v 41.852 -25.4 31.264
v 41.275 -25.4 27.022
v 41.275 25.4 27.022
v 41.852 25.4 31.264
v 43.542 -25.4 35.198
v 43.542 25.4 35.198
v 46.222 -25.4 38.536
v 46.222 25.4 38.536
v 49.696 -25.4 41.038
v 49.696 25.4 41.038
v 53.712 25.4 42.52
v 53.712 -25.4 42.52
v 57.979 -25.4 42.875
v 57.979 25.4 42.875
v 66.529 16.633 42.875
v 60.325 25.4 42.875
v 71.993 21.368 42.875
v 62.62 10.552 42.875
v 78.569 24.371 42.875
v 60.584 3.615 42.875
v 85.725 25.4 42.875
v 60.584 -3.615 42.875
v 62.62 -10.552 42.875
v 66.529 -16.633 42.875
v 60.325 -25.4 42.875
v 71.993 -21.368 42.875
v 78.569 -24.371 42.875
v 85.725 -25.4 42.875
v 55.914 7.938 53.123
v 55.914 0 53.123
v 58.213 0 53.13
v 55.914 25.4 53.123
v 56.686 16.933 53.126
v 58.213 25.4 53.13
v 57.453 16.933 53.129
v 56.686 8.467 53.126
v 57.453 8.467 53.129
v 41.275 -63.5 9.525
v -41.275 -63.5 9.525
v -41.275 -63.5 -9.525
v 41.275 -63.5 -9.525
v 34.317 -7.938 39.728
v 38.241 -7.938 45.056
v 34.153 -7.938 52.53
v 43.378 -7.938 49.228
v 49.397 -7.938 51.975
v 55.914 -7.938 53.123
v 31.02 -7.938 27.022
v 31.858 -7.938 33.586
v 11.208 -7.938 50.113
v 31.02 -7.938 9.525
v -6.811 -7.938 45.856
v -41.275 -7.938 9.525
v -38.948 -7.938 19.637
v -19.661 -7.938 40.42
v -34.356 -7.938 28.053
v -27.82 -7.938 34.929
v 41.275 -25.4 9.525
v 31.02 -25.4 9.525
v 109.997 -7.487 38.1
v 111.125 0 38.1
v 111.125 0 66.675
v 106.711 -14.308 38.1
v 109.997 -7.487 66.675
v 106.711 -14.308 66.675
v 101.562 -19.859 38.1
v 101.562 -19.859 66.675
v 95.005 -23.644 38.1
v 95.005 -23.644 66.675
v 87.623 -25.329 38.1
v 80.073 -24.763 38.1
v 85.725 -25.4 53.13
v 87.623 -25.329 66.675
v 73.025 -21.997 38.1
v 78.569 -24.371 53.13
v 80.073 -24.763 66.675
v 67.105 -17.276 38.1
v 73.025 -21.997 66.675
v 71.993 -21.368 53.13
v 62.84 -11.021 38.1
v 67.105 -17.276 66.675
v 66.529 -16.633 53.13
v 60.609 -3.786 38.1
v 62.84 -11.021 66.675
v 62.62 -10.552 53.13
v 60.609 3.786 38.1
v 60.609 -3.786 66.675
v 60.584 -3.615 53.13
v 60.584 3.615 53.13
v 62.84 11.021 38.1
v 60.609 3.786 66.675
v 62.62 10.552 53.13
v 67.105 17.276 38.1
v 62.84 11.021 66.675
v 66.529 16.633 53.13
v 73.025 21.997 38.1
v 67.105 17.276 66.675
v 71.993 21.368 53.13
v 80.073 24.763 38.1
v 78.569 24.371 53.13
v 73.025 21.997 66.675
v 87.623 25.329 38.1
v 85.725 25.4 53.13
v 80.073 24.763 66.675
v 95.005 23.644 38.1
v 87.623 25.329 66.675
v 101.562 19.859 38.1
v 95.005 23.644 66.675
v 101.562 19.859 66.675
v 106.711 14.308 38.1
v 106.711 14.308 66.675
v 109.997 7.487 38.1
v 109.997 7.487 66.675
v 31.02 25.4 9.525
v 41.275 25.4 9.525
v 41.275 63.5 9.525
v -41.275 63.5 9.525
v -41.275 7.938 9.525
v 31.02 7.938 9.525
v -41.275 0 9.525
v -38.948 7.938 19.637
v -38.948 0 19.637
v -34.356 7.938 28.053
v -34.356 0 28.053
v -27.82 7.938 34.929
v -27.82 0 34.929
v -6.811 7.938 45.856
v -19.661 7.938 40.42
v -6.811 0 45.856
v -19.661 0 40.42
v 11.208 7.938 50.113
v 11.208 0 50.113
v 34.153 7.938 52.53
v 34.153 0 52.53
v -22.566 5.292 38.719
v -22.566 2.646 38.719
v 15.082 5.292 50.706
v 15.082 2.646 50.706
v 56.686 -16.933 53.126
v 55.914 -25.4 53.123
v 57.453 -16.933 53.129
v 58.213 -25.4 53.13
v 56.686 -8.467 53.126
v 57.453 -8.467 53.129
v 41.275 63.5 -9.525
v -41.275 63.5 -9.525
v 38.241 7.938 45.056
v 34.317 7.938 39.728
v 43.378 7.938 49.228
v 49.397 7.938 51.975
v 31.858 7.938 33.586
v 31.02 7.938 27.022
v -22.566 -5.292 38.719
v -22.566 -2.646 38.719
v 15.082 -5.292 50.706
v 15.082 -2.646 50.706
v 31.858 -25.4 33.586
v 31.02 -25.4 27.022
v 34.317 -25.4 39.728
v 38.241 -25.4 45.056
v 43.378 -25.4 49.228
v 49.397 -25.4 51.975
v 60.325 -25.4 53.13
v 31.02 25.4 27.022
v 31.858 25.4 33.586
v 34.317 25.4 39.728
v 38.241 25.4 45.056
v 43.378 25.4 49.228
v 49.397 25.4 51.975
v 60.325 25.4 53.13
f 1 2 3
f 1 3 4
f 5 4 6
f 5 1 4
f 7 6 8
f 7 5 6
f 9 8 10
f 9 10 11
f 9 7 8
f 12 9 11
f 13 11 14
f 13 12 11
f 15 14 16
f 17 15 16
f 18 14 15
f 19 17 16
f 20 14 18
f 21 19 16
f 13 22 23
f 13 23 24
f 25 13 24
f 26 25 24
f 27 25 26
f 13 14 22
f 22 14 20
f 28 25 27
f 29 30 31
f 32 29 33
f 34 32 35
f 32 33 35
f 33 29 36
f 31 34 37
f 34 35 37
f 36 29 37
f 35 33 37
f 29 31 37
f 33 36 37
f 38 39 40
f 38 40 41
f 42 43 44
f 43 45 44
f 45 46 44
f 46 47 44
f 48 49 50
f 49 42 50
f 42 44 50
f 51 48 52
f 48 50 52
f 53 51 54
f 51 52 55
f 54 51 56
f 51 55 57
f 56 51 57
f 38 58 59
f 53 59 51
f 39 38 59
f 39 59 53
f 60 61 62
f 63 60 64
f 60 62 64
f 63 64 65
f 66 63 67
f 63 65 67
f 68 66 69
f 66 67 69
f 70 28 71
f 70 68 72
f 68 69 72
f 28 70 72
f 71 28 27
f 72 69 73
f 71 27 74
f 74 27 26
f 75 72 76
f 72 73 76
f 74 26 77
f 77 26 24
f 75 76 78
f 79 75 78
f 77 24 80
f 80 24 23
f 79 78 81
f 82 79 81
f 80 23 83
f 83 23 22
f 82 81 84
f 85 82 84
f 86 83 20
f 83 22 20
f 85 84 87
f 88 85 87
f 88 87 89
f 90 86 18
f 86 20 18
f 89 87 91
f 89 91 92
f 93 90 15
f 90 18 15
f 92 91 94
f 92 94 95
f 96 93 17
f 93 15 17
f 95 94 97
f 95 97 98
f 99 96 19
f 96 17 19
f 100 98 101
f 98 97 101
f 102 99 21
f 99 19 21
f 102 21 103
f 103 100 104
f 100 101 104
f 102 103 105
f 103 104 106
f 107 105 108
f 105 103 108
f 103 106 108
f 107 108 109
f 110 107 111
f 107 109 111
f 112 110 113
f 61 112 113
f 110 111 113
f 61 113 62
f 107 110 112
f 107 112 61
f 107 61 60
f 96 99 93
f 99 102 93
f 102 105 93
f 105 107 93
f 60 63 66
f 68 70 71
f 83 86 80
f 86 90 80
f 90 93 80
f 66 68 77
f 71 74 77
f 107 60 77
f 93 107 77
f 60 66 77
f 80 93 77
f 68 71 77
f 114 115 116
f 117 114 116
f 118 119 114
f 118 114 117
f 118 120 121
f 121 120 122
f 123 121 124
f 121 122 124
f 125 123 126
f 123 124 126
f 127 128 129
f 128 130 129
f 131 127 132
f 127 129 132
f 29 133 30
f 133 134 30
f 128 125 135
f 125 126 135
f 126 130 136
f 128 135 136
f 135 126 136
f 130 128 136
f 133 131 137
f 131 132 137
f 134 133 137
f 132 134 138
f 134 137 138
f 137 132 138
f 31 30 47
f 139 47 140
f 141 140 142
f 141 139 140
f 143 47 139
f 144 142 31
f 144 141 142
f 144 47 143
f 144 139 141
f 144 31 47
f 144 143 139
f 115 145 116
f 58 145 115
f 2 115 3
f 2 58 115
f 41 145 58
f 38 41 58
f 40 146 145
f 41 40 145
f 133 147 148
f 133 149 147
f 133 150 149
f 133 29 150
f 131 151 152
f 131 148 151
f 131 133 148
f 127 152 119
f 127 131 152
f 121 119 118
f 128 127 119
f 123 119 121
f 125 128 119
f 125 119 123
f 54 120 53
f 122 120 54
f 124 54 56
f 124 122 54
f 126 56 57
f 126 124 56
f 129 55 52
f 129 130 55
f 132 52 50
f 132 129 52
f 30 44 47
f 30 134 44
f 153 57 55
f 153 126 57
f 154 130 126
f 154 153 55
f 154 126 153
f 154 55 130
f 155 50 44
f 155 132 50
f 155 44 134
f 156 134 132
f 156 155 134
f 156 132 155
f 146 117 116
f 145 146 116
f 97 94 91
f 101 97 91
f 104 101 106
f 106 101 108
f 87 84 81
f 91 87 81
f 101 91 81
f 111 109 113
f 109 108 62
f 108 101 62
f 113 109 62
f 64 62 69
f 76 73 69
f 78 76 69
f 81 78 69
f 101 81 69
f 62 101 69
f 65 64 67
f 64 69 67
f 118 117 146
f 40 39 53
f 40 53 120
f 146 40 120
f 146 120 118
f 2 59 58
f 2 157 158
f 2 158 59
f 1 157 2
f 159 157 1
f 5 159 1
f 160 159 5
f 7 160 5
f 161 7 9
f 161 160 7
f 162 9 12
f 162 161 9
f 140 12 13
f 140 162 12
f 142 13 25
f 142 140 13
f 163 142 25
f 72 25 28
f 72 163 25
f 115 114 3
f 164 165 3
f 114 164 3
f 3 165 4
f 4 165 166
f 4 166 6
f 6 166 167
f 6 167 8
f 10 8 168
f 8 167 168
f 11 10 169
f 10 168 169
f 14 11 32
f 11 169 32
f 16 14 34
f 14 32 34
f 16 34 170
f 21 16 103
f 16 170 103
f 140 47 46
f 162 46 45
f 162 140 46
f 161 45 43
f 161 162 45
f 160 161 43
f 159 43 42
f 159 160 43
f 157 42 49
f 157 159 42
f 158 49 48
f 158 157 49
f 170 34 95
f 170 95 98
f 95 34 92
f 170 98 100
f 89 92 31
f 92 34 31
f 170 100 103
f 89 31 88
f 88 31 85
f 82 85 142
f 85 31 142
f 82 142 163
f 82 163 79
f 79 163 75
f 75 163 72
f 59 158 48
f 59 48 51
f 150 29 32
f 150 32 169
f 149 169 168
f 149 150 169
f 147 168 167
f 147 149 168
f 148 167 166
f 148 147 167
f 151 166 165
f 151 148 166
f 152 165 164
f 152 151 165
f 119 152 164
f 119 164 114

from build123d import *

# Parameters (mm, degrees)
F1_DEPTH = 63.5
F0_W     = 25.4
F0_H     = 10.2552045137
F2_DEPTH = 25.4
F3_DEPTH = 7.9375


with BuildPart() as f1:
    # F0 (on Front) → F1 (new body, symmetric)
    with BuildSketch(Plane.XZ):
        Polygon((-41.275, 9.525), (-41.275, -9.525), (41.275, -9.525), (41.275, 9.525), (31.0197954863, 9.525), align=None)
    extrude(amount=F1_DEPTH, both=True)

    # F0 (on Front) → F2 (join, symmetric)
    with BuildSketch(Plane.XZ):
        with BuildLine():
            Line((31.0197954863, 9.525), (41.275, 9.525))
            Line((41.275, 9.525), (41.275, 27.0218505154))
            ThreePointArc((41.275, 27.0218505154), (46.2216382961, 38.5364731957), (57.978815492, 42.8752))
            Line((57.978815492, 42.8752), (60.325, 42.8752))
            Line((60.325, 42.8752), (60.325, 53.1304045137))
            Line((60.325, 53.1304045137), (58.2134829791, 53.1304045137))
            add(Edge.make_bspline(
                [(55.9138915665, 53.1228011469), (56.6888329701, 53.1264926522), (57.455577593, 53.128923314), (58.2134829791, 53.1304045137)],
                knots=[106.4066342926, 106.4066342926, 106.4066342926, 106.4066342926, 108.6249950439, 108.6249950439, 108.6249950439, 108.6249950439], degree=3))
            ThreePointArc((55.9138915665, 53.1228011469), (38.2411746254, 45.0563704946), (31.0197954863, 27.0218505154))
            Line((31.0197954863, 27.0218505154), (31.0197954863, 9.525))
        make_face()
        with Locations((73.025, 48.0028022568)):
            Rectangle(F0_W, F0_H)
    extrude(amount=F2_DEPTH, both=True)

    # F0 (on Front) → F3 (join, symmetric)
    with BuildSketch(Plane.XZ):
        with BuildLine():
            add(Edge.make_bspline(
                [(-41.275, 9.525), (-37.2872071441, 49.8677554135), (18.7427928229, 52.94573317), (55.9138915665, 53.1228011469)],
                knots=[0, 0, 0, 0, 106.4066342926, 106.4066342926, 106.4066342926, 106.4066342926], degree=3))
            Line((-41.275, 9.525), (31.0197954863, 9.525))
            Line((31.0197954863, 9.525), (31.0197954863, 27.0218505154))
            ThreePointArc((31.0197954863, 27.0218505154), (38.2411746254, 45.0563704946), (55.9138915665, 53.1228011469))
        make_face()
    extrude(amount=F3_DEPTH, both=True)

    # F0 (on Front) → F4 (revolve)
    with BuildSketch(Plane.XZ):
        Polygon((85.725, 66.675), (85.725, 53.1304045137), (85.725, 42.8752), (85.725, 38.1), (111.125, 38.1), (111.125, 66.675), align=None)
    revolve(axis=Axis((85.725, 0, 52.3875), (0, 0, -1)))


solid = f1.part
